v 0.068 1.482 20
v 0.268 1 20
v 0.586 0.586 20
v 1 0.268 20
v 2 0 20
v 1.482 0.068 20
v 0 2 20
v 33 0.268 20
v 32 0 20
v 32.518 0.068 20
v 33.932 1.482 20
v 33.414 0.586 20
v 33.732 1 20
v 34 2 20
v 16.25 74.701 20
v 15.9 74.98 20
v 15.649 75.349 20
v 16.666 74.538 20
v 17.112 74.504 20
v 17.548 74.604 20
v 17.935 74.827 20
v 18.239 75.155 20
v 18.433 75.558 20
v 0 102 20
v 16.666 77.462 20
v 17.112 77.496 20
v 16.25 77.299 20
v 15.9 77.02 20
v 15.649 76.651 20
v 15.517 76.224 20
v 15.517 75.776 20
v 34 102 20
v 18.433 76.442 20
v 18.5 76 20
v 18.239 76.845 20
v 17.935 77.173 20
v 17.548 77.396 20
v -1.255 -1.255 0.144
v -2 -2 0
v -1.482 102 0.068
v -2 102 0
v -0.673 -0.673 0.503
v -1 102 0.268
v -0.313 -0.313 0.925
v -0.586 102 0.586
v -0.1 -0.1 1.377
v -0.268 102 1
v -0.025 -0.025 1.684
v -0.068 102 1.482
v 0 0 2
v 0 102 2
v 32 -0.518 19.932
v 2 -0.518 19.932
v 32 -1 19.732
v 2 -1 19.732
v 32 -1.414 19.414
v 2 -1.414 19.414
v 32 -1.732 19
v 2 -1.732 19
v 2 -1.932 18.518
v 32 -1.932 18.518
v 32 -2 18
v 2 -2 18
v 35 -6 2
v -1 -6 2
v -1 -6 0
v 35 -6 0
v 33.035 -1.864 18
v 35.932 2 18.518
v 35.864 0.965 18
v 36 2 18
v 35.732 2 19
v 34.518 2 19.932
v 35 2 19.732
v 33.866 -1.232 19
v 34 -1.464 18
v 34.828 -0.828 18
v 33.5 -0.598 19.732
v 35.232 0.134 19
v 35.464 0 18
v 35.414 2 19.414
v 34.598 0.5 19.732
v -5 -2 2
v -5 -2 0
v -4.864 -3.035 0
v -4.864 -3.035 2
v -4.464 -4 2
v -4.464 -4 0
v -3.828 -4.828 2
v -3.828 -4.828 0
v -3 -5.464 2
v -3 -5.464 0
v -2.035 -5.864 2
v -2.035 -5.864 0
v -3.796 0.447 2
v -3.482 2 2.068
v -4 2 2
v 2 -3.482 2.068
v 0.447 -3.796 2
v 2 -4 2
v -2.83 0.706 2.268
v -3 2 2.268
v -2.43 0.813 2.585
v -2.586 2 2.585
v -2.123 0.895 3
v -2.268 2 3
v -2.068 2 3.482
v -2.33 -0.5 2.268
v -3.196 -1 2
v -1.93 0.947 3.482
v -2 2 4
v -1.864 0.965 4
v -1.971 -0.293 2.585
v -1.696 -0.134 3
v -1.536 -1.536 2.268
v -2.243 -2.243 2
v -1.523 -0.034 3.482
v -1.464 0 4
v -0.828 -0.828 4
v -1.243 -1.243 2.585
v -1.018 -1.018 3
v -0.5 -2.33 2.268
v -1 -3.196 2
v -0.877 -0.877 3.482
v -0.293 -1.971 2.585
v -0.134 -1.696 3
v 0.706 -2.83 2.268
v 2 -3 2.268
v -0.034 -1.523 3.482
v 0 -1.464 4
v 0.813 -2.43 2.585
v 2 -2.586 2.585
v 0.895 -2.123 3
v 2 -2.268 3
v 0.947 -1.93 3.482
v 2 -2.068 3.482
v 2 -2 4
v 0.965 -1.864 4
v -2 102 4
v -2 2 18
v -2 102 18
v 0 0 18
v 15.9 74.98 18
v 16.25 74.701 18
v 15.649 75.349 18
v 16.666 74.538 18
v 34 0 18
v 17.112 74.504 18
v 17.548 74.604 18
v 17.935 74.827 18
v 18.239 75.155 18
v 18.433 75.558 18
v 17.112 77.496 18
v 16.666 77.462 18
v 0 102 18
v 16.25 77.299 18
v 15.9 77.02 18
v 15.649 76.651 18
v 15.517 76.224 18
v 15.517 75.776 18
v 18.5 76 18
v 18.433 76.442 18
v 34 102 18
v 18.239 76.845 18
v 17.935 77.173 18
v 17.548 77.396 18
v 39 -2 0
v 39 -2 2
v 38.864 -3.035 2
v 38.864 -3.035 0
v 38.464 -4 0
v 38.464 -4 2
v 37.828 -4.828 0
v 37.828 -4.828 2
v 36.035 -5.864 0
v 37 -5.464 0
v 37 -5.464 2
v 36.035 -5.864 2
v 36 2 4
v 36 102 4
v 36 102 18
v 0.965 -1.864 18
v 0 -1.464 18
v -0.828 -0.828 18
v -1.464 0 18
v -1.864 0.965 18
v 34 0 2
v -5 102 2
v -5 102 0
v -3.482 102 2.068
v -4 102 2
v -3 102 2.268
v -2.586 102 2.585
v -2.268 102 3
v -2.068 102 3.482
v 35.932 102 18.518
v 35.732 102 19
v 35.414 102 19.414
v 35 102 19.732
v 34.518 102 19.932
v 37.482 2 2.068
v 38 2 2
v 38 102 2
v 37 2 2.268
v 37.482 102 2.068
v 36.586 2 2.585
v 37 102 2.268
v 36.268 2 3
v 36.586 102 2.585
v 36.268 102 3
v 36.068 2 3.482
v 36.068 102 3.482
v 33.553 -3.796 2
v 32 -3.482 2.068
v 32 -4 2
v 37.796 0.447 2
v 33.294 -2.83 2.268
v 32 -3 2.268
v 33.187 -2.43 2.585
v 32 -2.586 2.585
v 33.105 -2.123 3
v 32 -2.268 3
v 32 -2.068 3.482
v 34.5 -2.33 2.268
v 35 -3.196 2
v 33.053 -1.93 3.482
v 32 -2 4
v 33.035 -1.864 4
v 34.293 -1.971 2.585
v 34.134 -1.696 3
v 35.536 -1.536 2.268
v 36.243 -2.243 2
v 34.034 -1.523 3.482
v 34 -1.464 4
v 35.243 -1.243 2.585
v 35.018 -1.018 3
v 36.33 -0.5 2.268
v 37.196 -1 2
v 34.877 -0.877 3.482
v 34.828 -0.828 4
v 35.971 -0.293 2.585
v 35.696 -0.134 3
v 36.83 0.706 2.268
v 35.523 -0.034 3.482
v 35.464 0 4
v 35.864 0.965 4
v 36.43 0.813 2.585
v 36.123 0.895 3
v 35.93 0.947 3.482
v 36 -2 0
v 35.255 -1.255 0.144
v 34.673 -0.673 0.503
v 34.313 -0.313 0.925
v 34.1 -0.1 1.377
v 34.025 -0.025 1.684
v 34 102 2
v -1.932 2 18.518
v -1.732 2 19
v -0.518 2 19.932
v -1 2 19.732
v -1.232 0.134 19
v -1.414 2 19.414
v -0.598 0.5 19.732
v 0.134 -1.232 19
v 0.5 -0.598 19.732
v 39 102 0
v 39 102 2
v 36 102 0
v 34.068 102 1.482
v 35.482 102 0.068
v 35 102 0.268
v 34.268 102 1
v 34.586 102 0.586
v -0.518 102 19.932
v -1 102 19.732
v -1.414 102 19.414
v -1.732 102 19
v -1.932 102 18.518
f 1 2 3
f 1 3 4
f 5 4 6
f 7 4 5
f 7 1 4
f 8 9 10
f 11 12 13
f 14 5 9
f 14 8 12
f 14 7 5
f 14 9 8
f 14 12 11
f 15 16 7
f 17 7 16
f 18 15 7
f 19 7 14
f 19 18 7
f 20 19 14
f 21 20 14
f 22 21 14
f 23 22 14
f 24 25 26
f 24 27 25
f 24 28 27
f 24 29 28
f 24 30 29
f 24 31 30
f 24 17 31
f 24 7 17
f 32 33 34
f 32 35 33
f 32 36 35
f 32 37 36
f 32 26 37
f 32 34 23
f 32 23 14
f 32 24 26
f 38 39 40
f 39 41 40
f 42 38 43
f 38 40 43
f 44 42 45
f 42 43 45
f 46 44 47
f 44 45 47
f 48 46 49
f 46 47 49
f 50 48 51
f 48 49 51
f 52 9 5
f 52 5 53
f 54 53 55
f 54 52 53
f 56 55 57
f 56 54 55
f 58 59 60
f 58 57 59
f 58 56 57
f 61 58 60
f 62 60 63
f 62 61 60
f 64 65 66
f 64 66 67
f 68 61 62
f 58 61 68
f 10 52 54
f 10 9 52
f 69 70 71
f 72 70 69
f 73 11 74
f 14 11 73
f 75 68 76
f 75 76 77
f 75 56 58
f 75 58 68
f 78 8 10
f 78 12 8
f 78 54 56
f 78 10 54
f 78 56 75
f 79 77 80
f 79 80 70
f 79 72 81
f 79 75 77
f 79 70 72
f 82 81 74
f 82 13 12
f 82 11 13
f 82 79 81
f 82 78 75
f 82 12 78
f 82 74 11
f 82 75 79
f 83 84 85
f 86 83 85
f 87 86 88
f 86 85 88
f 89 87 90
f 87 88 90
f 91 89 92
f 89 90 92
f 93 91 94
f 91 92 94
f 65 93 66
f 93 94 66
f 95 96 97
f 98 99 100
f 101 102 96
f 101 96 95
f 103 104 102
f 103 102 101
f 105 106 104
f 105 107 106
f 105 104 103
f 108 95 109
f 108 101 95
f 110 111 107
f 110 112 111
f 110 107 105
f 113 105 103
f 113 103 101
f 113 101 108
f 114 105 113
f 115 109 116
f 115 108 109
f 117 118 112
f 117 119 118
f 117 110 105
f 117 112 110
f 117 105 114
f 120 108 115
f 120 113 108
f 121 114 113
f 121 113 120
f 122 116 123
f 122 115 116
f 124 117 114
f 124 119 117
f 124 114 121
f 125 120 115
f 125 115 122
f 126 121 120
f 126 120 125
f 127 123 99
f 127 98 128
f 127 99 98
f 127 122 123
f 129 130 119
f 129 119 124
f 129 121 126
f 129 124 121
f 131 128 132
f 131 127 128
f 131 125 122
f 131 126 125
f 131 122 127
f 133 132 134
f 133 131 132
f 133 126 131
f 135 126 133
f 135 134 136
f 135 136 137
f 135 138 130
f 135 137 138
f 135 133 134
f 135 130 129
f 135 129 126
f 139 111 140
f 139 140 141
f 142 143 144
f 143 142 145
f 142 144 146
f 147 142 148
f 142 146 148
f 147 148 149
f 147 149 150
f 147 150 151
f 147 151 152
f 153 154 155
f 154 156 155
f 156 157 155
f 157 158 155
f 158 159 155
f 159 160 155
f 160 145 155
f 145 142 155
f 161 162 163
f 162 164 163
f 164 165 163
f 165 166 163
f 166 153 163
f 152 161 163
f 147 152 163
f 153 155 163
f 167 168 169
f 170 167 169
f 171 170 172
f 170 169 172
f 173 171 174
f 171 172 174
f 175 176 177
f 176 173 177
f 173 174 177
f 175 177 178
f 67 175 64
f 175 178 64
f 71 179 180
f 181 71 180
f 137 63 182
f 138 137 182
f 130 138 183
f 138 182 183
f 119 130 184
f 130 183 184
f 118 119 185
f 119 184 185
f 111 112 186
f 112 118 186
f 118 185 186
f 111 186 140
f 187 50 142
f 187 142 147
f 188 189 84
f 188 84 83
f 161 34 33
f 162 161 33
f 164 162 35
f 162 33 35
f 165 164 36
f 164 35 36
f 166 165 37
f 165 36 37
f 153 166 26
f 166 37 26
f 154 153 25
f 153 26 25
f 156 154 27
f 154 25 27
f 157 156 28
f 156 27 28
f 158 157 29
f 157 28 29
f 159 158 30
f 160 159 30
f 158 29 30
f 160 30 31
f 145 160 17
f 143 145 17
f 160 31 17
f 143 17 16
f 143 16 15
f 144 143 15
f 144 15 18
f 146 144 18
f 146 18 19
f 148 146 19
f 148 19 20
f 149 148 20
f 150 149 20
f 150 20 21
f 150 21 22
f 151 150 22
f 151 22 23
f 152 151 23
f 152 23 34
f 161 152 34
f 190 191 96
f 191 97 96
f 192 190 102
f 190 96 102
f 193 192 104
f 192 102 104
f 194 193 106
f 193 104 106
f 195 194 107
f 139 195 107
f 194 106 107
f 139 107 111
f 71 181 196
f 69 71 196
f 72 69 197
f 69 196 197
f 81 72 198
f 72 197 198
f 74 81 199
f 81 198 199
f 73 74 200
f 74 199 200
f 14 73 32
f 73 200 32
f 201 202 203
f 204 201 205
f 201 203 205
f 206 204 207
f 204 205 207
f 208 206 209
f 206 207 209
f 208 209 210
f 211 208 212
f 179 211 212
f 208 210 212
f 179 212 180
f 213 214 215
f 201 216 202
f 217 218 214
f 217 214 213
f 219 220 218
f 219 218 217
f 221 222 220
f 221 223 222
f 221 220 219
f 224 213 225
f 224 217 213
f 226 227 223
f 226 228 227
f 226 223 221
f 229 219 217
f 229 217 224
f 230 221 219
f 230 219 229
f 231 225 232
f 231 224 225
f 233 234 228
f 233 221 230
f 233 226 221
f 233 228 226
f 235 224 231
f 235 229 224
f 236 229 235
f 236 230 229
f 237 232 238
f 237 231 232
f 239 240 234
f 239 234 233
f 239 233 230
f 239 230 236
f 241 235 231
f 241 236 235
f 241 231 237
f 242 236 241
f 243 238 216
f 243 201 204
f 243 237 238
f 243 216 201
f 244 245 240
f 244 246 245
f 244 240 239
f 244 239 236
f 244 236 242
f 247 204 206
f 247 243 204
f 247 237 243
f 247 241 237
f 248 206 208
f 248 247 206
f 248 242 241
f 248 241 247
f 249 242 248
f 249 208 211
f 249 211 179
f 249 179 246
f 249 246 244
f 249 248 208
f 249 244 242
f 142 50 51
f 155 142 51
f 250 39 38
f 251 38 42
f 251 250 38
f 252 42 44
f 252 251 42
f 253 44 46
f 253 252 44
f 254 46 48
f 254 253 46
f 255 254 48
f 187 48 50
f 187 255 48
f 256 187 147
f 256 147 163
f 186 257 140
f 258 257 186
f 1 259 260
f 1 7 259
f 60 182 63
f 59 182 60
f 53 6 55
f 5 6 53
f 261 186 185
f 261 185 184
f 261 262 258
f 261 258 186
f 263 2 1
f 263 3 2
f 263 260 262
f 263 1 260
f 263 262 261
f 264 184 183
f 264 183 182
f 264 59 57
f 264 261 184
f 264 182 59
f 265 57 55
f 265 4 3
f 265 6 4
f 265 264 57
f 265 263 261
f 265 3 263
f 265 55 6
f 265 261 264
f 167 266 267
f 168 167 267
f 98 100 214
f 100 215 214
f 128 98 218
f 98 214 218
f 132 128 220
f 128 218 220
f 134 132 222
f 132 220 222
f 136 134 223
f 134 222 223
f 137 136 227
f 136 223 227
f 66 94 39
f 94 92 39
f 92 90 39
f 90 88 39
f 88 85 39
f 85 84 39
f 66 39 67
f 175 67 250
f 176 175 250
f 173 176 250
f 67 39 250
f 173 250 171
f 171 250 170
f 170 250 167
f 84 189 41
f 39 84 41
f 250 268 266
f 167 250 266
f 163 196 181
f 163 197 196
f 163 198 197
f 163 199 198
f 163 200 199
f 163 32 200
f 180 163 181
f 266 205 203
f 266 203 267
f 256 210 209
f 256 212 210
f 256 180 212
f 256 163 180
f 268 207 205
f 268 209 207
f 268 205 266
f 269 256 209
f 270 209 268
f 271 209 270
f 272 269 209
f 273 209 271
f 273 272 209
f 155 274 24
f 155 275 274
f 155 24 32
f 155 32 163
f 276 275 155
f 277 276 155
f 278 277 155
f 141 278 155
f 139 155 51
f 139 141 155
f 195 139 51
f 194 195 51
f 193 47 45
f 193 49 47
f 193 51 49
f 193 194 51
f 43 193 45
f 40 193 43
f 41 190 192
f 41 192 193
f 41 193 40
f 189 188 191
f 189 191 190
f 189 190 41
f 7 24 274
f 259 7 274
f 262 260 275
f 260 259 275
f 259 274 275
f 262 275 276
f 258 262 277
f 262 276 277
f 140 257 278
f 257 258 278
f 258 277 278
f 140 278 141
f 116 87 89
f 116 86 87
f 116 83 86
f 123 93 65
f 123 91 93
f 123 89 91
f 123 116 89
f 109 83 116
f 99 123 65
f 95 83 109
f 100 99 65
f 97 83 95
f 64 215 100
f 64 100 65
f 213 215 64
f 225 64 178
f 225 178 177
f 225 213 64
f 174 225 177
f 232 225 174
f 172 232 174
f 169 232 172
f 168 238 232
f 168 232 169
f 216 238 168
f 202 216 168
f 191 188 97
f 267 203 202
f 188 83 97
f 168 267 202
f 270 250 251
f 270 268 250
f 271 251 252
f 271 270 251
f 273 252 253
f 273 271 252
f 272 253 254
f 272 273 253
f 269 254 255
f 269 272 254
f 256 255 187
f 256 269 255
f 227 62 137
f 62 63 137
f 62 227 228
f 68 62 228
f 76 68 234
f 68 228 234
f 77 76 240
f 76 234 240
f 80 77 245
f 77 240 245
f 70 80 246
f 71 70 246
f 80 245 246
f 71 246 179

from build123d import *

# Parameters (mm, degrees)
ESQUISSE1_W             = 34
ESQUISSE1_H             = 100
BOSS_EXTRU_1_DEPTH      = 18
COQUE1_T                = 2
ESQUISSE2_W             = 34
ESQUISSE2_H             = 18
ENL_V_MAT_EXTRU_1_DEPTH = 18
CONG_1_R                = 2
ESQUISSE5_W             = 1.999683034
ESQUISSE5_H             = 104
BOSS_EXTRU_2_DEPTH      = 3
ESQUISSE6_W             = 1.999683034
ESQUISSE6_H             = 104
BOSS_EXTRU_3_DEPTH      = 3
ESQUISSE7_W             = 44
ESQUISSE7_H             = 1.999683034
BOSS_EXTRU_4_DEPTH      = 4
CONG_2_R                = 4
CONG_3_R                = 2
CONG_5_R                = 2
ESQUISSE8_R             = 1.5
ENL_V_MAT_EXTRU_2_DEPTH = 10


with BuildPart() as part:
    # Esquisse1 → Boss.-Extru.1 (new body)
    with BuildSketch(Plane.XY):
        with Locations((17, 50)):
            Rectangle(ESQUISSE1_W, ESQUISSE1_H)
    extrude(amount=BOSS_EXTRU_1_DEPTH)

    # Coque1
    coque1_openings = [part.faces().sort_by_distance(p)[0] for p in [
        (17, 50, 0),
    ]]
    offset(amount=COQUE1_T, openings=coque1_openings, kind=Kind.INTERSECTION)

    # Esquisse2 → Enlèv. mat.-Extru.1 (cut)
    with BuildSketch(Plane.XZ.offset(-100)):
        with Locations((17, 9)):
            Rectangle(ESQUISSE2_W, ESQUISSE2_H)
    extrude(amount=-ENL_V_MAT_EXTRU_1_DEPTH, mode=Mode.SUBTRACT)

    # Congé1
    cong_1_edges = [part.edges().sort_by_distance(p)[0] for p in [
        (36, 50, 20),
        (-2, 50, 20),
        (17, -2, 20),
    ]]
    fillet(cong_1_edges, radius=CONG_1_R)

    # Esquisse5 → Boss.-Extru.2 (add)
    with BuildSketch(Plane.ZY.offset(2)):
        with Locations((0.999841517, 50)):
            Rectangle(ESQUISSE5_W, ESQUISSE5_H)
    extrude(amount=BOSS_EXTRU_2_DEPTH)

    # Esquisse6 → Boss.-Extru.3 (add)
    with BuildSketch(Plane(origin=(36, 0, 0), x_dir=(0, 0, -1), z_dir=(1, 0, 0))):
        with Locations((-0.999841517, 50)):
            Rectangle(ESQUISSE6_W, ESQUISSE6_H)
    extrude(amount=BOSS_EXTRU_3_DEPTH)

    # Esquisse7 → Boss.-Extru.4 (add)
    with BuildSketch(Plane.XZ.offset(2)):
        with Locations((17, 0.999841517)):
            Rectangle(ESQUISSE7_W, ESQUISSE7_H)
    extrude(amount=BOSS_EXTRU_4_DEPTH)

    # Congé2
    # the kernel refuses this fillet: 4 mm, written as the material it takes off along each edge
    with BuildSketch(Plane(origin=(2, 2, 20), x_dir=(-1, 0, 0), z_dir=(0, 1, 0))) as cong_2_piece_1:
        with BuildLine():
            CenterArc((2, -2), 2, 0, 90)
            Line((4, -2), (4, 0))
            Line((4, 0), (2, 0))
        make_face()
    revolve(axis=Axis((2, 2, 20), (0, 0, 1)), revolution_arc=90, mode=Mode.SUBTRACT)
    with BuildSketch(Plane(origin=(32, 2, 20), x_dir=(0, -1, 0), z_dir=(-1, 0, 0))) as cong_2_piece_2:
        with BuildLine():
            CenterArc((2, -2), 2, 0, 90)
            Line((4, -2), (4, 0))
            Line((4, 0), (2, 0))
        make_face()
    revolve(axis=Axis((32, 2, 20), (0, 0, 1)), revolution_arc=90, mode=Mode.SUBTRACT)
    with BuildSketch(Plane(origin=(36, -2, 1.999683034), x_dir=(-1, 0, 0), z_dir=(0, 0, 1)), Plane(origin=(-2, -2, 20), x_dir=(1, 0, 0), z_dir=(0, 0, -1))) as cong_2_piece_3:
        with BuildLine():
            CenterArc((CONG_2_R, -CONG_2_R), CONG_2_R, 90, 90)
            Line((0, -CONG_2_R), (0, 0))
            Line((0, 0), (CONG_2_R, 0))
        make_face()
    extrude(amount=18.000316966, mode=Mode.SUBTRACT)
    with BuildSketch(Plane(origin=(39, -6, 11.999683034), x_dir=(0, 1, 0), z_dir=(0, 0, -1))) as cong_2_piece_4:
        with BuildLine():
            CenterArc((CONG_2_R, -CONG_2_R), CONG_2_R, 90, 90)
            Line((0, -CONG_2_R), (0, 0))
            Line((0, 0), (CONG_2_R, 0))
        make_face()
    extrude(amount=21.999683034, mode=Mode.SUBTRACT)
    with BuildSketch(Plane(origin=(-5, -6, -10), x_dir=(1, 0, 0), z_dir=(0, 0, 1))) as cong_2_piece_5:
        with BuildLine():
            CenterArc((CONG_2_R, CONG_2_R), CONG_2_R, 180, 90)
            Line((0, CONG_2_R), (0, 0))
            Line((0, 0), (CONG_2_R, 0))
        make_face()
    extrude(amount=21.999683034, mode=Mode.SUBTRACT)

    # Congé3
    cong_3_edges = [part.edges().sort_by_distance(p)[0] for p in [
        (17, -2, 1.999683034),
        (-2, 52, 1.999683034),
        (34.828427125, -0.828427125, 1.999683034),
        (-0.828427125, -0.828427125, 1.999683034),
        (36, 52, 1.999683034),
    ]]
    fillet(cong_3_edges, radius=CONG_3_R)

    # Congé5
    cong_5_edges = [part.edges().sort_by_distance(p)[0] for p in [
        (0, 51, 0),
        (17, 0, 0),
        (34, 51, 0),
    ]]
    fillet(cong_5_edges, radius=CONG_5_R)

    # Esquisse8 → Enlèv. mat.-Extru.2 (cut)
    with BuildSketch(Plane.XY.offset(20)):
        with Locations((17, 76)):
            Circle(ESQUISSE8_R)
    extrude(amount=-ENL_V_MAT_EXTRU_2_DEPTH, mode=Mode.SUBTRACT)


solid = part.part
